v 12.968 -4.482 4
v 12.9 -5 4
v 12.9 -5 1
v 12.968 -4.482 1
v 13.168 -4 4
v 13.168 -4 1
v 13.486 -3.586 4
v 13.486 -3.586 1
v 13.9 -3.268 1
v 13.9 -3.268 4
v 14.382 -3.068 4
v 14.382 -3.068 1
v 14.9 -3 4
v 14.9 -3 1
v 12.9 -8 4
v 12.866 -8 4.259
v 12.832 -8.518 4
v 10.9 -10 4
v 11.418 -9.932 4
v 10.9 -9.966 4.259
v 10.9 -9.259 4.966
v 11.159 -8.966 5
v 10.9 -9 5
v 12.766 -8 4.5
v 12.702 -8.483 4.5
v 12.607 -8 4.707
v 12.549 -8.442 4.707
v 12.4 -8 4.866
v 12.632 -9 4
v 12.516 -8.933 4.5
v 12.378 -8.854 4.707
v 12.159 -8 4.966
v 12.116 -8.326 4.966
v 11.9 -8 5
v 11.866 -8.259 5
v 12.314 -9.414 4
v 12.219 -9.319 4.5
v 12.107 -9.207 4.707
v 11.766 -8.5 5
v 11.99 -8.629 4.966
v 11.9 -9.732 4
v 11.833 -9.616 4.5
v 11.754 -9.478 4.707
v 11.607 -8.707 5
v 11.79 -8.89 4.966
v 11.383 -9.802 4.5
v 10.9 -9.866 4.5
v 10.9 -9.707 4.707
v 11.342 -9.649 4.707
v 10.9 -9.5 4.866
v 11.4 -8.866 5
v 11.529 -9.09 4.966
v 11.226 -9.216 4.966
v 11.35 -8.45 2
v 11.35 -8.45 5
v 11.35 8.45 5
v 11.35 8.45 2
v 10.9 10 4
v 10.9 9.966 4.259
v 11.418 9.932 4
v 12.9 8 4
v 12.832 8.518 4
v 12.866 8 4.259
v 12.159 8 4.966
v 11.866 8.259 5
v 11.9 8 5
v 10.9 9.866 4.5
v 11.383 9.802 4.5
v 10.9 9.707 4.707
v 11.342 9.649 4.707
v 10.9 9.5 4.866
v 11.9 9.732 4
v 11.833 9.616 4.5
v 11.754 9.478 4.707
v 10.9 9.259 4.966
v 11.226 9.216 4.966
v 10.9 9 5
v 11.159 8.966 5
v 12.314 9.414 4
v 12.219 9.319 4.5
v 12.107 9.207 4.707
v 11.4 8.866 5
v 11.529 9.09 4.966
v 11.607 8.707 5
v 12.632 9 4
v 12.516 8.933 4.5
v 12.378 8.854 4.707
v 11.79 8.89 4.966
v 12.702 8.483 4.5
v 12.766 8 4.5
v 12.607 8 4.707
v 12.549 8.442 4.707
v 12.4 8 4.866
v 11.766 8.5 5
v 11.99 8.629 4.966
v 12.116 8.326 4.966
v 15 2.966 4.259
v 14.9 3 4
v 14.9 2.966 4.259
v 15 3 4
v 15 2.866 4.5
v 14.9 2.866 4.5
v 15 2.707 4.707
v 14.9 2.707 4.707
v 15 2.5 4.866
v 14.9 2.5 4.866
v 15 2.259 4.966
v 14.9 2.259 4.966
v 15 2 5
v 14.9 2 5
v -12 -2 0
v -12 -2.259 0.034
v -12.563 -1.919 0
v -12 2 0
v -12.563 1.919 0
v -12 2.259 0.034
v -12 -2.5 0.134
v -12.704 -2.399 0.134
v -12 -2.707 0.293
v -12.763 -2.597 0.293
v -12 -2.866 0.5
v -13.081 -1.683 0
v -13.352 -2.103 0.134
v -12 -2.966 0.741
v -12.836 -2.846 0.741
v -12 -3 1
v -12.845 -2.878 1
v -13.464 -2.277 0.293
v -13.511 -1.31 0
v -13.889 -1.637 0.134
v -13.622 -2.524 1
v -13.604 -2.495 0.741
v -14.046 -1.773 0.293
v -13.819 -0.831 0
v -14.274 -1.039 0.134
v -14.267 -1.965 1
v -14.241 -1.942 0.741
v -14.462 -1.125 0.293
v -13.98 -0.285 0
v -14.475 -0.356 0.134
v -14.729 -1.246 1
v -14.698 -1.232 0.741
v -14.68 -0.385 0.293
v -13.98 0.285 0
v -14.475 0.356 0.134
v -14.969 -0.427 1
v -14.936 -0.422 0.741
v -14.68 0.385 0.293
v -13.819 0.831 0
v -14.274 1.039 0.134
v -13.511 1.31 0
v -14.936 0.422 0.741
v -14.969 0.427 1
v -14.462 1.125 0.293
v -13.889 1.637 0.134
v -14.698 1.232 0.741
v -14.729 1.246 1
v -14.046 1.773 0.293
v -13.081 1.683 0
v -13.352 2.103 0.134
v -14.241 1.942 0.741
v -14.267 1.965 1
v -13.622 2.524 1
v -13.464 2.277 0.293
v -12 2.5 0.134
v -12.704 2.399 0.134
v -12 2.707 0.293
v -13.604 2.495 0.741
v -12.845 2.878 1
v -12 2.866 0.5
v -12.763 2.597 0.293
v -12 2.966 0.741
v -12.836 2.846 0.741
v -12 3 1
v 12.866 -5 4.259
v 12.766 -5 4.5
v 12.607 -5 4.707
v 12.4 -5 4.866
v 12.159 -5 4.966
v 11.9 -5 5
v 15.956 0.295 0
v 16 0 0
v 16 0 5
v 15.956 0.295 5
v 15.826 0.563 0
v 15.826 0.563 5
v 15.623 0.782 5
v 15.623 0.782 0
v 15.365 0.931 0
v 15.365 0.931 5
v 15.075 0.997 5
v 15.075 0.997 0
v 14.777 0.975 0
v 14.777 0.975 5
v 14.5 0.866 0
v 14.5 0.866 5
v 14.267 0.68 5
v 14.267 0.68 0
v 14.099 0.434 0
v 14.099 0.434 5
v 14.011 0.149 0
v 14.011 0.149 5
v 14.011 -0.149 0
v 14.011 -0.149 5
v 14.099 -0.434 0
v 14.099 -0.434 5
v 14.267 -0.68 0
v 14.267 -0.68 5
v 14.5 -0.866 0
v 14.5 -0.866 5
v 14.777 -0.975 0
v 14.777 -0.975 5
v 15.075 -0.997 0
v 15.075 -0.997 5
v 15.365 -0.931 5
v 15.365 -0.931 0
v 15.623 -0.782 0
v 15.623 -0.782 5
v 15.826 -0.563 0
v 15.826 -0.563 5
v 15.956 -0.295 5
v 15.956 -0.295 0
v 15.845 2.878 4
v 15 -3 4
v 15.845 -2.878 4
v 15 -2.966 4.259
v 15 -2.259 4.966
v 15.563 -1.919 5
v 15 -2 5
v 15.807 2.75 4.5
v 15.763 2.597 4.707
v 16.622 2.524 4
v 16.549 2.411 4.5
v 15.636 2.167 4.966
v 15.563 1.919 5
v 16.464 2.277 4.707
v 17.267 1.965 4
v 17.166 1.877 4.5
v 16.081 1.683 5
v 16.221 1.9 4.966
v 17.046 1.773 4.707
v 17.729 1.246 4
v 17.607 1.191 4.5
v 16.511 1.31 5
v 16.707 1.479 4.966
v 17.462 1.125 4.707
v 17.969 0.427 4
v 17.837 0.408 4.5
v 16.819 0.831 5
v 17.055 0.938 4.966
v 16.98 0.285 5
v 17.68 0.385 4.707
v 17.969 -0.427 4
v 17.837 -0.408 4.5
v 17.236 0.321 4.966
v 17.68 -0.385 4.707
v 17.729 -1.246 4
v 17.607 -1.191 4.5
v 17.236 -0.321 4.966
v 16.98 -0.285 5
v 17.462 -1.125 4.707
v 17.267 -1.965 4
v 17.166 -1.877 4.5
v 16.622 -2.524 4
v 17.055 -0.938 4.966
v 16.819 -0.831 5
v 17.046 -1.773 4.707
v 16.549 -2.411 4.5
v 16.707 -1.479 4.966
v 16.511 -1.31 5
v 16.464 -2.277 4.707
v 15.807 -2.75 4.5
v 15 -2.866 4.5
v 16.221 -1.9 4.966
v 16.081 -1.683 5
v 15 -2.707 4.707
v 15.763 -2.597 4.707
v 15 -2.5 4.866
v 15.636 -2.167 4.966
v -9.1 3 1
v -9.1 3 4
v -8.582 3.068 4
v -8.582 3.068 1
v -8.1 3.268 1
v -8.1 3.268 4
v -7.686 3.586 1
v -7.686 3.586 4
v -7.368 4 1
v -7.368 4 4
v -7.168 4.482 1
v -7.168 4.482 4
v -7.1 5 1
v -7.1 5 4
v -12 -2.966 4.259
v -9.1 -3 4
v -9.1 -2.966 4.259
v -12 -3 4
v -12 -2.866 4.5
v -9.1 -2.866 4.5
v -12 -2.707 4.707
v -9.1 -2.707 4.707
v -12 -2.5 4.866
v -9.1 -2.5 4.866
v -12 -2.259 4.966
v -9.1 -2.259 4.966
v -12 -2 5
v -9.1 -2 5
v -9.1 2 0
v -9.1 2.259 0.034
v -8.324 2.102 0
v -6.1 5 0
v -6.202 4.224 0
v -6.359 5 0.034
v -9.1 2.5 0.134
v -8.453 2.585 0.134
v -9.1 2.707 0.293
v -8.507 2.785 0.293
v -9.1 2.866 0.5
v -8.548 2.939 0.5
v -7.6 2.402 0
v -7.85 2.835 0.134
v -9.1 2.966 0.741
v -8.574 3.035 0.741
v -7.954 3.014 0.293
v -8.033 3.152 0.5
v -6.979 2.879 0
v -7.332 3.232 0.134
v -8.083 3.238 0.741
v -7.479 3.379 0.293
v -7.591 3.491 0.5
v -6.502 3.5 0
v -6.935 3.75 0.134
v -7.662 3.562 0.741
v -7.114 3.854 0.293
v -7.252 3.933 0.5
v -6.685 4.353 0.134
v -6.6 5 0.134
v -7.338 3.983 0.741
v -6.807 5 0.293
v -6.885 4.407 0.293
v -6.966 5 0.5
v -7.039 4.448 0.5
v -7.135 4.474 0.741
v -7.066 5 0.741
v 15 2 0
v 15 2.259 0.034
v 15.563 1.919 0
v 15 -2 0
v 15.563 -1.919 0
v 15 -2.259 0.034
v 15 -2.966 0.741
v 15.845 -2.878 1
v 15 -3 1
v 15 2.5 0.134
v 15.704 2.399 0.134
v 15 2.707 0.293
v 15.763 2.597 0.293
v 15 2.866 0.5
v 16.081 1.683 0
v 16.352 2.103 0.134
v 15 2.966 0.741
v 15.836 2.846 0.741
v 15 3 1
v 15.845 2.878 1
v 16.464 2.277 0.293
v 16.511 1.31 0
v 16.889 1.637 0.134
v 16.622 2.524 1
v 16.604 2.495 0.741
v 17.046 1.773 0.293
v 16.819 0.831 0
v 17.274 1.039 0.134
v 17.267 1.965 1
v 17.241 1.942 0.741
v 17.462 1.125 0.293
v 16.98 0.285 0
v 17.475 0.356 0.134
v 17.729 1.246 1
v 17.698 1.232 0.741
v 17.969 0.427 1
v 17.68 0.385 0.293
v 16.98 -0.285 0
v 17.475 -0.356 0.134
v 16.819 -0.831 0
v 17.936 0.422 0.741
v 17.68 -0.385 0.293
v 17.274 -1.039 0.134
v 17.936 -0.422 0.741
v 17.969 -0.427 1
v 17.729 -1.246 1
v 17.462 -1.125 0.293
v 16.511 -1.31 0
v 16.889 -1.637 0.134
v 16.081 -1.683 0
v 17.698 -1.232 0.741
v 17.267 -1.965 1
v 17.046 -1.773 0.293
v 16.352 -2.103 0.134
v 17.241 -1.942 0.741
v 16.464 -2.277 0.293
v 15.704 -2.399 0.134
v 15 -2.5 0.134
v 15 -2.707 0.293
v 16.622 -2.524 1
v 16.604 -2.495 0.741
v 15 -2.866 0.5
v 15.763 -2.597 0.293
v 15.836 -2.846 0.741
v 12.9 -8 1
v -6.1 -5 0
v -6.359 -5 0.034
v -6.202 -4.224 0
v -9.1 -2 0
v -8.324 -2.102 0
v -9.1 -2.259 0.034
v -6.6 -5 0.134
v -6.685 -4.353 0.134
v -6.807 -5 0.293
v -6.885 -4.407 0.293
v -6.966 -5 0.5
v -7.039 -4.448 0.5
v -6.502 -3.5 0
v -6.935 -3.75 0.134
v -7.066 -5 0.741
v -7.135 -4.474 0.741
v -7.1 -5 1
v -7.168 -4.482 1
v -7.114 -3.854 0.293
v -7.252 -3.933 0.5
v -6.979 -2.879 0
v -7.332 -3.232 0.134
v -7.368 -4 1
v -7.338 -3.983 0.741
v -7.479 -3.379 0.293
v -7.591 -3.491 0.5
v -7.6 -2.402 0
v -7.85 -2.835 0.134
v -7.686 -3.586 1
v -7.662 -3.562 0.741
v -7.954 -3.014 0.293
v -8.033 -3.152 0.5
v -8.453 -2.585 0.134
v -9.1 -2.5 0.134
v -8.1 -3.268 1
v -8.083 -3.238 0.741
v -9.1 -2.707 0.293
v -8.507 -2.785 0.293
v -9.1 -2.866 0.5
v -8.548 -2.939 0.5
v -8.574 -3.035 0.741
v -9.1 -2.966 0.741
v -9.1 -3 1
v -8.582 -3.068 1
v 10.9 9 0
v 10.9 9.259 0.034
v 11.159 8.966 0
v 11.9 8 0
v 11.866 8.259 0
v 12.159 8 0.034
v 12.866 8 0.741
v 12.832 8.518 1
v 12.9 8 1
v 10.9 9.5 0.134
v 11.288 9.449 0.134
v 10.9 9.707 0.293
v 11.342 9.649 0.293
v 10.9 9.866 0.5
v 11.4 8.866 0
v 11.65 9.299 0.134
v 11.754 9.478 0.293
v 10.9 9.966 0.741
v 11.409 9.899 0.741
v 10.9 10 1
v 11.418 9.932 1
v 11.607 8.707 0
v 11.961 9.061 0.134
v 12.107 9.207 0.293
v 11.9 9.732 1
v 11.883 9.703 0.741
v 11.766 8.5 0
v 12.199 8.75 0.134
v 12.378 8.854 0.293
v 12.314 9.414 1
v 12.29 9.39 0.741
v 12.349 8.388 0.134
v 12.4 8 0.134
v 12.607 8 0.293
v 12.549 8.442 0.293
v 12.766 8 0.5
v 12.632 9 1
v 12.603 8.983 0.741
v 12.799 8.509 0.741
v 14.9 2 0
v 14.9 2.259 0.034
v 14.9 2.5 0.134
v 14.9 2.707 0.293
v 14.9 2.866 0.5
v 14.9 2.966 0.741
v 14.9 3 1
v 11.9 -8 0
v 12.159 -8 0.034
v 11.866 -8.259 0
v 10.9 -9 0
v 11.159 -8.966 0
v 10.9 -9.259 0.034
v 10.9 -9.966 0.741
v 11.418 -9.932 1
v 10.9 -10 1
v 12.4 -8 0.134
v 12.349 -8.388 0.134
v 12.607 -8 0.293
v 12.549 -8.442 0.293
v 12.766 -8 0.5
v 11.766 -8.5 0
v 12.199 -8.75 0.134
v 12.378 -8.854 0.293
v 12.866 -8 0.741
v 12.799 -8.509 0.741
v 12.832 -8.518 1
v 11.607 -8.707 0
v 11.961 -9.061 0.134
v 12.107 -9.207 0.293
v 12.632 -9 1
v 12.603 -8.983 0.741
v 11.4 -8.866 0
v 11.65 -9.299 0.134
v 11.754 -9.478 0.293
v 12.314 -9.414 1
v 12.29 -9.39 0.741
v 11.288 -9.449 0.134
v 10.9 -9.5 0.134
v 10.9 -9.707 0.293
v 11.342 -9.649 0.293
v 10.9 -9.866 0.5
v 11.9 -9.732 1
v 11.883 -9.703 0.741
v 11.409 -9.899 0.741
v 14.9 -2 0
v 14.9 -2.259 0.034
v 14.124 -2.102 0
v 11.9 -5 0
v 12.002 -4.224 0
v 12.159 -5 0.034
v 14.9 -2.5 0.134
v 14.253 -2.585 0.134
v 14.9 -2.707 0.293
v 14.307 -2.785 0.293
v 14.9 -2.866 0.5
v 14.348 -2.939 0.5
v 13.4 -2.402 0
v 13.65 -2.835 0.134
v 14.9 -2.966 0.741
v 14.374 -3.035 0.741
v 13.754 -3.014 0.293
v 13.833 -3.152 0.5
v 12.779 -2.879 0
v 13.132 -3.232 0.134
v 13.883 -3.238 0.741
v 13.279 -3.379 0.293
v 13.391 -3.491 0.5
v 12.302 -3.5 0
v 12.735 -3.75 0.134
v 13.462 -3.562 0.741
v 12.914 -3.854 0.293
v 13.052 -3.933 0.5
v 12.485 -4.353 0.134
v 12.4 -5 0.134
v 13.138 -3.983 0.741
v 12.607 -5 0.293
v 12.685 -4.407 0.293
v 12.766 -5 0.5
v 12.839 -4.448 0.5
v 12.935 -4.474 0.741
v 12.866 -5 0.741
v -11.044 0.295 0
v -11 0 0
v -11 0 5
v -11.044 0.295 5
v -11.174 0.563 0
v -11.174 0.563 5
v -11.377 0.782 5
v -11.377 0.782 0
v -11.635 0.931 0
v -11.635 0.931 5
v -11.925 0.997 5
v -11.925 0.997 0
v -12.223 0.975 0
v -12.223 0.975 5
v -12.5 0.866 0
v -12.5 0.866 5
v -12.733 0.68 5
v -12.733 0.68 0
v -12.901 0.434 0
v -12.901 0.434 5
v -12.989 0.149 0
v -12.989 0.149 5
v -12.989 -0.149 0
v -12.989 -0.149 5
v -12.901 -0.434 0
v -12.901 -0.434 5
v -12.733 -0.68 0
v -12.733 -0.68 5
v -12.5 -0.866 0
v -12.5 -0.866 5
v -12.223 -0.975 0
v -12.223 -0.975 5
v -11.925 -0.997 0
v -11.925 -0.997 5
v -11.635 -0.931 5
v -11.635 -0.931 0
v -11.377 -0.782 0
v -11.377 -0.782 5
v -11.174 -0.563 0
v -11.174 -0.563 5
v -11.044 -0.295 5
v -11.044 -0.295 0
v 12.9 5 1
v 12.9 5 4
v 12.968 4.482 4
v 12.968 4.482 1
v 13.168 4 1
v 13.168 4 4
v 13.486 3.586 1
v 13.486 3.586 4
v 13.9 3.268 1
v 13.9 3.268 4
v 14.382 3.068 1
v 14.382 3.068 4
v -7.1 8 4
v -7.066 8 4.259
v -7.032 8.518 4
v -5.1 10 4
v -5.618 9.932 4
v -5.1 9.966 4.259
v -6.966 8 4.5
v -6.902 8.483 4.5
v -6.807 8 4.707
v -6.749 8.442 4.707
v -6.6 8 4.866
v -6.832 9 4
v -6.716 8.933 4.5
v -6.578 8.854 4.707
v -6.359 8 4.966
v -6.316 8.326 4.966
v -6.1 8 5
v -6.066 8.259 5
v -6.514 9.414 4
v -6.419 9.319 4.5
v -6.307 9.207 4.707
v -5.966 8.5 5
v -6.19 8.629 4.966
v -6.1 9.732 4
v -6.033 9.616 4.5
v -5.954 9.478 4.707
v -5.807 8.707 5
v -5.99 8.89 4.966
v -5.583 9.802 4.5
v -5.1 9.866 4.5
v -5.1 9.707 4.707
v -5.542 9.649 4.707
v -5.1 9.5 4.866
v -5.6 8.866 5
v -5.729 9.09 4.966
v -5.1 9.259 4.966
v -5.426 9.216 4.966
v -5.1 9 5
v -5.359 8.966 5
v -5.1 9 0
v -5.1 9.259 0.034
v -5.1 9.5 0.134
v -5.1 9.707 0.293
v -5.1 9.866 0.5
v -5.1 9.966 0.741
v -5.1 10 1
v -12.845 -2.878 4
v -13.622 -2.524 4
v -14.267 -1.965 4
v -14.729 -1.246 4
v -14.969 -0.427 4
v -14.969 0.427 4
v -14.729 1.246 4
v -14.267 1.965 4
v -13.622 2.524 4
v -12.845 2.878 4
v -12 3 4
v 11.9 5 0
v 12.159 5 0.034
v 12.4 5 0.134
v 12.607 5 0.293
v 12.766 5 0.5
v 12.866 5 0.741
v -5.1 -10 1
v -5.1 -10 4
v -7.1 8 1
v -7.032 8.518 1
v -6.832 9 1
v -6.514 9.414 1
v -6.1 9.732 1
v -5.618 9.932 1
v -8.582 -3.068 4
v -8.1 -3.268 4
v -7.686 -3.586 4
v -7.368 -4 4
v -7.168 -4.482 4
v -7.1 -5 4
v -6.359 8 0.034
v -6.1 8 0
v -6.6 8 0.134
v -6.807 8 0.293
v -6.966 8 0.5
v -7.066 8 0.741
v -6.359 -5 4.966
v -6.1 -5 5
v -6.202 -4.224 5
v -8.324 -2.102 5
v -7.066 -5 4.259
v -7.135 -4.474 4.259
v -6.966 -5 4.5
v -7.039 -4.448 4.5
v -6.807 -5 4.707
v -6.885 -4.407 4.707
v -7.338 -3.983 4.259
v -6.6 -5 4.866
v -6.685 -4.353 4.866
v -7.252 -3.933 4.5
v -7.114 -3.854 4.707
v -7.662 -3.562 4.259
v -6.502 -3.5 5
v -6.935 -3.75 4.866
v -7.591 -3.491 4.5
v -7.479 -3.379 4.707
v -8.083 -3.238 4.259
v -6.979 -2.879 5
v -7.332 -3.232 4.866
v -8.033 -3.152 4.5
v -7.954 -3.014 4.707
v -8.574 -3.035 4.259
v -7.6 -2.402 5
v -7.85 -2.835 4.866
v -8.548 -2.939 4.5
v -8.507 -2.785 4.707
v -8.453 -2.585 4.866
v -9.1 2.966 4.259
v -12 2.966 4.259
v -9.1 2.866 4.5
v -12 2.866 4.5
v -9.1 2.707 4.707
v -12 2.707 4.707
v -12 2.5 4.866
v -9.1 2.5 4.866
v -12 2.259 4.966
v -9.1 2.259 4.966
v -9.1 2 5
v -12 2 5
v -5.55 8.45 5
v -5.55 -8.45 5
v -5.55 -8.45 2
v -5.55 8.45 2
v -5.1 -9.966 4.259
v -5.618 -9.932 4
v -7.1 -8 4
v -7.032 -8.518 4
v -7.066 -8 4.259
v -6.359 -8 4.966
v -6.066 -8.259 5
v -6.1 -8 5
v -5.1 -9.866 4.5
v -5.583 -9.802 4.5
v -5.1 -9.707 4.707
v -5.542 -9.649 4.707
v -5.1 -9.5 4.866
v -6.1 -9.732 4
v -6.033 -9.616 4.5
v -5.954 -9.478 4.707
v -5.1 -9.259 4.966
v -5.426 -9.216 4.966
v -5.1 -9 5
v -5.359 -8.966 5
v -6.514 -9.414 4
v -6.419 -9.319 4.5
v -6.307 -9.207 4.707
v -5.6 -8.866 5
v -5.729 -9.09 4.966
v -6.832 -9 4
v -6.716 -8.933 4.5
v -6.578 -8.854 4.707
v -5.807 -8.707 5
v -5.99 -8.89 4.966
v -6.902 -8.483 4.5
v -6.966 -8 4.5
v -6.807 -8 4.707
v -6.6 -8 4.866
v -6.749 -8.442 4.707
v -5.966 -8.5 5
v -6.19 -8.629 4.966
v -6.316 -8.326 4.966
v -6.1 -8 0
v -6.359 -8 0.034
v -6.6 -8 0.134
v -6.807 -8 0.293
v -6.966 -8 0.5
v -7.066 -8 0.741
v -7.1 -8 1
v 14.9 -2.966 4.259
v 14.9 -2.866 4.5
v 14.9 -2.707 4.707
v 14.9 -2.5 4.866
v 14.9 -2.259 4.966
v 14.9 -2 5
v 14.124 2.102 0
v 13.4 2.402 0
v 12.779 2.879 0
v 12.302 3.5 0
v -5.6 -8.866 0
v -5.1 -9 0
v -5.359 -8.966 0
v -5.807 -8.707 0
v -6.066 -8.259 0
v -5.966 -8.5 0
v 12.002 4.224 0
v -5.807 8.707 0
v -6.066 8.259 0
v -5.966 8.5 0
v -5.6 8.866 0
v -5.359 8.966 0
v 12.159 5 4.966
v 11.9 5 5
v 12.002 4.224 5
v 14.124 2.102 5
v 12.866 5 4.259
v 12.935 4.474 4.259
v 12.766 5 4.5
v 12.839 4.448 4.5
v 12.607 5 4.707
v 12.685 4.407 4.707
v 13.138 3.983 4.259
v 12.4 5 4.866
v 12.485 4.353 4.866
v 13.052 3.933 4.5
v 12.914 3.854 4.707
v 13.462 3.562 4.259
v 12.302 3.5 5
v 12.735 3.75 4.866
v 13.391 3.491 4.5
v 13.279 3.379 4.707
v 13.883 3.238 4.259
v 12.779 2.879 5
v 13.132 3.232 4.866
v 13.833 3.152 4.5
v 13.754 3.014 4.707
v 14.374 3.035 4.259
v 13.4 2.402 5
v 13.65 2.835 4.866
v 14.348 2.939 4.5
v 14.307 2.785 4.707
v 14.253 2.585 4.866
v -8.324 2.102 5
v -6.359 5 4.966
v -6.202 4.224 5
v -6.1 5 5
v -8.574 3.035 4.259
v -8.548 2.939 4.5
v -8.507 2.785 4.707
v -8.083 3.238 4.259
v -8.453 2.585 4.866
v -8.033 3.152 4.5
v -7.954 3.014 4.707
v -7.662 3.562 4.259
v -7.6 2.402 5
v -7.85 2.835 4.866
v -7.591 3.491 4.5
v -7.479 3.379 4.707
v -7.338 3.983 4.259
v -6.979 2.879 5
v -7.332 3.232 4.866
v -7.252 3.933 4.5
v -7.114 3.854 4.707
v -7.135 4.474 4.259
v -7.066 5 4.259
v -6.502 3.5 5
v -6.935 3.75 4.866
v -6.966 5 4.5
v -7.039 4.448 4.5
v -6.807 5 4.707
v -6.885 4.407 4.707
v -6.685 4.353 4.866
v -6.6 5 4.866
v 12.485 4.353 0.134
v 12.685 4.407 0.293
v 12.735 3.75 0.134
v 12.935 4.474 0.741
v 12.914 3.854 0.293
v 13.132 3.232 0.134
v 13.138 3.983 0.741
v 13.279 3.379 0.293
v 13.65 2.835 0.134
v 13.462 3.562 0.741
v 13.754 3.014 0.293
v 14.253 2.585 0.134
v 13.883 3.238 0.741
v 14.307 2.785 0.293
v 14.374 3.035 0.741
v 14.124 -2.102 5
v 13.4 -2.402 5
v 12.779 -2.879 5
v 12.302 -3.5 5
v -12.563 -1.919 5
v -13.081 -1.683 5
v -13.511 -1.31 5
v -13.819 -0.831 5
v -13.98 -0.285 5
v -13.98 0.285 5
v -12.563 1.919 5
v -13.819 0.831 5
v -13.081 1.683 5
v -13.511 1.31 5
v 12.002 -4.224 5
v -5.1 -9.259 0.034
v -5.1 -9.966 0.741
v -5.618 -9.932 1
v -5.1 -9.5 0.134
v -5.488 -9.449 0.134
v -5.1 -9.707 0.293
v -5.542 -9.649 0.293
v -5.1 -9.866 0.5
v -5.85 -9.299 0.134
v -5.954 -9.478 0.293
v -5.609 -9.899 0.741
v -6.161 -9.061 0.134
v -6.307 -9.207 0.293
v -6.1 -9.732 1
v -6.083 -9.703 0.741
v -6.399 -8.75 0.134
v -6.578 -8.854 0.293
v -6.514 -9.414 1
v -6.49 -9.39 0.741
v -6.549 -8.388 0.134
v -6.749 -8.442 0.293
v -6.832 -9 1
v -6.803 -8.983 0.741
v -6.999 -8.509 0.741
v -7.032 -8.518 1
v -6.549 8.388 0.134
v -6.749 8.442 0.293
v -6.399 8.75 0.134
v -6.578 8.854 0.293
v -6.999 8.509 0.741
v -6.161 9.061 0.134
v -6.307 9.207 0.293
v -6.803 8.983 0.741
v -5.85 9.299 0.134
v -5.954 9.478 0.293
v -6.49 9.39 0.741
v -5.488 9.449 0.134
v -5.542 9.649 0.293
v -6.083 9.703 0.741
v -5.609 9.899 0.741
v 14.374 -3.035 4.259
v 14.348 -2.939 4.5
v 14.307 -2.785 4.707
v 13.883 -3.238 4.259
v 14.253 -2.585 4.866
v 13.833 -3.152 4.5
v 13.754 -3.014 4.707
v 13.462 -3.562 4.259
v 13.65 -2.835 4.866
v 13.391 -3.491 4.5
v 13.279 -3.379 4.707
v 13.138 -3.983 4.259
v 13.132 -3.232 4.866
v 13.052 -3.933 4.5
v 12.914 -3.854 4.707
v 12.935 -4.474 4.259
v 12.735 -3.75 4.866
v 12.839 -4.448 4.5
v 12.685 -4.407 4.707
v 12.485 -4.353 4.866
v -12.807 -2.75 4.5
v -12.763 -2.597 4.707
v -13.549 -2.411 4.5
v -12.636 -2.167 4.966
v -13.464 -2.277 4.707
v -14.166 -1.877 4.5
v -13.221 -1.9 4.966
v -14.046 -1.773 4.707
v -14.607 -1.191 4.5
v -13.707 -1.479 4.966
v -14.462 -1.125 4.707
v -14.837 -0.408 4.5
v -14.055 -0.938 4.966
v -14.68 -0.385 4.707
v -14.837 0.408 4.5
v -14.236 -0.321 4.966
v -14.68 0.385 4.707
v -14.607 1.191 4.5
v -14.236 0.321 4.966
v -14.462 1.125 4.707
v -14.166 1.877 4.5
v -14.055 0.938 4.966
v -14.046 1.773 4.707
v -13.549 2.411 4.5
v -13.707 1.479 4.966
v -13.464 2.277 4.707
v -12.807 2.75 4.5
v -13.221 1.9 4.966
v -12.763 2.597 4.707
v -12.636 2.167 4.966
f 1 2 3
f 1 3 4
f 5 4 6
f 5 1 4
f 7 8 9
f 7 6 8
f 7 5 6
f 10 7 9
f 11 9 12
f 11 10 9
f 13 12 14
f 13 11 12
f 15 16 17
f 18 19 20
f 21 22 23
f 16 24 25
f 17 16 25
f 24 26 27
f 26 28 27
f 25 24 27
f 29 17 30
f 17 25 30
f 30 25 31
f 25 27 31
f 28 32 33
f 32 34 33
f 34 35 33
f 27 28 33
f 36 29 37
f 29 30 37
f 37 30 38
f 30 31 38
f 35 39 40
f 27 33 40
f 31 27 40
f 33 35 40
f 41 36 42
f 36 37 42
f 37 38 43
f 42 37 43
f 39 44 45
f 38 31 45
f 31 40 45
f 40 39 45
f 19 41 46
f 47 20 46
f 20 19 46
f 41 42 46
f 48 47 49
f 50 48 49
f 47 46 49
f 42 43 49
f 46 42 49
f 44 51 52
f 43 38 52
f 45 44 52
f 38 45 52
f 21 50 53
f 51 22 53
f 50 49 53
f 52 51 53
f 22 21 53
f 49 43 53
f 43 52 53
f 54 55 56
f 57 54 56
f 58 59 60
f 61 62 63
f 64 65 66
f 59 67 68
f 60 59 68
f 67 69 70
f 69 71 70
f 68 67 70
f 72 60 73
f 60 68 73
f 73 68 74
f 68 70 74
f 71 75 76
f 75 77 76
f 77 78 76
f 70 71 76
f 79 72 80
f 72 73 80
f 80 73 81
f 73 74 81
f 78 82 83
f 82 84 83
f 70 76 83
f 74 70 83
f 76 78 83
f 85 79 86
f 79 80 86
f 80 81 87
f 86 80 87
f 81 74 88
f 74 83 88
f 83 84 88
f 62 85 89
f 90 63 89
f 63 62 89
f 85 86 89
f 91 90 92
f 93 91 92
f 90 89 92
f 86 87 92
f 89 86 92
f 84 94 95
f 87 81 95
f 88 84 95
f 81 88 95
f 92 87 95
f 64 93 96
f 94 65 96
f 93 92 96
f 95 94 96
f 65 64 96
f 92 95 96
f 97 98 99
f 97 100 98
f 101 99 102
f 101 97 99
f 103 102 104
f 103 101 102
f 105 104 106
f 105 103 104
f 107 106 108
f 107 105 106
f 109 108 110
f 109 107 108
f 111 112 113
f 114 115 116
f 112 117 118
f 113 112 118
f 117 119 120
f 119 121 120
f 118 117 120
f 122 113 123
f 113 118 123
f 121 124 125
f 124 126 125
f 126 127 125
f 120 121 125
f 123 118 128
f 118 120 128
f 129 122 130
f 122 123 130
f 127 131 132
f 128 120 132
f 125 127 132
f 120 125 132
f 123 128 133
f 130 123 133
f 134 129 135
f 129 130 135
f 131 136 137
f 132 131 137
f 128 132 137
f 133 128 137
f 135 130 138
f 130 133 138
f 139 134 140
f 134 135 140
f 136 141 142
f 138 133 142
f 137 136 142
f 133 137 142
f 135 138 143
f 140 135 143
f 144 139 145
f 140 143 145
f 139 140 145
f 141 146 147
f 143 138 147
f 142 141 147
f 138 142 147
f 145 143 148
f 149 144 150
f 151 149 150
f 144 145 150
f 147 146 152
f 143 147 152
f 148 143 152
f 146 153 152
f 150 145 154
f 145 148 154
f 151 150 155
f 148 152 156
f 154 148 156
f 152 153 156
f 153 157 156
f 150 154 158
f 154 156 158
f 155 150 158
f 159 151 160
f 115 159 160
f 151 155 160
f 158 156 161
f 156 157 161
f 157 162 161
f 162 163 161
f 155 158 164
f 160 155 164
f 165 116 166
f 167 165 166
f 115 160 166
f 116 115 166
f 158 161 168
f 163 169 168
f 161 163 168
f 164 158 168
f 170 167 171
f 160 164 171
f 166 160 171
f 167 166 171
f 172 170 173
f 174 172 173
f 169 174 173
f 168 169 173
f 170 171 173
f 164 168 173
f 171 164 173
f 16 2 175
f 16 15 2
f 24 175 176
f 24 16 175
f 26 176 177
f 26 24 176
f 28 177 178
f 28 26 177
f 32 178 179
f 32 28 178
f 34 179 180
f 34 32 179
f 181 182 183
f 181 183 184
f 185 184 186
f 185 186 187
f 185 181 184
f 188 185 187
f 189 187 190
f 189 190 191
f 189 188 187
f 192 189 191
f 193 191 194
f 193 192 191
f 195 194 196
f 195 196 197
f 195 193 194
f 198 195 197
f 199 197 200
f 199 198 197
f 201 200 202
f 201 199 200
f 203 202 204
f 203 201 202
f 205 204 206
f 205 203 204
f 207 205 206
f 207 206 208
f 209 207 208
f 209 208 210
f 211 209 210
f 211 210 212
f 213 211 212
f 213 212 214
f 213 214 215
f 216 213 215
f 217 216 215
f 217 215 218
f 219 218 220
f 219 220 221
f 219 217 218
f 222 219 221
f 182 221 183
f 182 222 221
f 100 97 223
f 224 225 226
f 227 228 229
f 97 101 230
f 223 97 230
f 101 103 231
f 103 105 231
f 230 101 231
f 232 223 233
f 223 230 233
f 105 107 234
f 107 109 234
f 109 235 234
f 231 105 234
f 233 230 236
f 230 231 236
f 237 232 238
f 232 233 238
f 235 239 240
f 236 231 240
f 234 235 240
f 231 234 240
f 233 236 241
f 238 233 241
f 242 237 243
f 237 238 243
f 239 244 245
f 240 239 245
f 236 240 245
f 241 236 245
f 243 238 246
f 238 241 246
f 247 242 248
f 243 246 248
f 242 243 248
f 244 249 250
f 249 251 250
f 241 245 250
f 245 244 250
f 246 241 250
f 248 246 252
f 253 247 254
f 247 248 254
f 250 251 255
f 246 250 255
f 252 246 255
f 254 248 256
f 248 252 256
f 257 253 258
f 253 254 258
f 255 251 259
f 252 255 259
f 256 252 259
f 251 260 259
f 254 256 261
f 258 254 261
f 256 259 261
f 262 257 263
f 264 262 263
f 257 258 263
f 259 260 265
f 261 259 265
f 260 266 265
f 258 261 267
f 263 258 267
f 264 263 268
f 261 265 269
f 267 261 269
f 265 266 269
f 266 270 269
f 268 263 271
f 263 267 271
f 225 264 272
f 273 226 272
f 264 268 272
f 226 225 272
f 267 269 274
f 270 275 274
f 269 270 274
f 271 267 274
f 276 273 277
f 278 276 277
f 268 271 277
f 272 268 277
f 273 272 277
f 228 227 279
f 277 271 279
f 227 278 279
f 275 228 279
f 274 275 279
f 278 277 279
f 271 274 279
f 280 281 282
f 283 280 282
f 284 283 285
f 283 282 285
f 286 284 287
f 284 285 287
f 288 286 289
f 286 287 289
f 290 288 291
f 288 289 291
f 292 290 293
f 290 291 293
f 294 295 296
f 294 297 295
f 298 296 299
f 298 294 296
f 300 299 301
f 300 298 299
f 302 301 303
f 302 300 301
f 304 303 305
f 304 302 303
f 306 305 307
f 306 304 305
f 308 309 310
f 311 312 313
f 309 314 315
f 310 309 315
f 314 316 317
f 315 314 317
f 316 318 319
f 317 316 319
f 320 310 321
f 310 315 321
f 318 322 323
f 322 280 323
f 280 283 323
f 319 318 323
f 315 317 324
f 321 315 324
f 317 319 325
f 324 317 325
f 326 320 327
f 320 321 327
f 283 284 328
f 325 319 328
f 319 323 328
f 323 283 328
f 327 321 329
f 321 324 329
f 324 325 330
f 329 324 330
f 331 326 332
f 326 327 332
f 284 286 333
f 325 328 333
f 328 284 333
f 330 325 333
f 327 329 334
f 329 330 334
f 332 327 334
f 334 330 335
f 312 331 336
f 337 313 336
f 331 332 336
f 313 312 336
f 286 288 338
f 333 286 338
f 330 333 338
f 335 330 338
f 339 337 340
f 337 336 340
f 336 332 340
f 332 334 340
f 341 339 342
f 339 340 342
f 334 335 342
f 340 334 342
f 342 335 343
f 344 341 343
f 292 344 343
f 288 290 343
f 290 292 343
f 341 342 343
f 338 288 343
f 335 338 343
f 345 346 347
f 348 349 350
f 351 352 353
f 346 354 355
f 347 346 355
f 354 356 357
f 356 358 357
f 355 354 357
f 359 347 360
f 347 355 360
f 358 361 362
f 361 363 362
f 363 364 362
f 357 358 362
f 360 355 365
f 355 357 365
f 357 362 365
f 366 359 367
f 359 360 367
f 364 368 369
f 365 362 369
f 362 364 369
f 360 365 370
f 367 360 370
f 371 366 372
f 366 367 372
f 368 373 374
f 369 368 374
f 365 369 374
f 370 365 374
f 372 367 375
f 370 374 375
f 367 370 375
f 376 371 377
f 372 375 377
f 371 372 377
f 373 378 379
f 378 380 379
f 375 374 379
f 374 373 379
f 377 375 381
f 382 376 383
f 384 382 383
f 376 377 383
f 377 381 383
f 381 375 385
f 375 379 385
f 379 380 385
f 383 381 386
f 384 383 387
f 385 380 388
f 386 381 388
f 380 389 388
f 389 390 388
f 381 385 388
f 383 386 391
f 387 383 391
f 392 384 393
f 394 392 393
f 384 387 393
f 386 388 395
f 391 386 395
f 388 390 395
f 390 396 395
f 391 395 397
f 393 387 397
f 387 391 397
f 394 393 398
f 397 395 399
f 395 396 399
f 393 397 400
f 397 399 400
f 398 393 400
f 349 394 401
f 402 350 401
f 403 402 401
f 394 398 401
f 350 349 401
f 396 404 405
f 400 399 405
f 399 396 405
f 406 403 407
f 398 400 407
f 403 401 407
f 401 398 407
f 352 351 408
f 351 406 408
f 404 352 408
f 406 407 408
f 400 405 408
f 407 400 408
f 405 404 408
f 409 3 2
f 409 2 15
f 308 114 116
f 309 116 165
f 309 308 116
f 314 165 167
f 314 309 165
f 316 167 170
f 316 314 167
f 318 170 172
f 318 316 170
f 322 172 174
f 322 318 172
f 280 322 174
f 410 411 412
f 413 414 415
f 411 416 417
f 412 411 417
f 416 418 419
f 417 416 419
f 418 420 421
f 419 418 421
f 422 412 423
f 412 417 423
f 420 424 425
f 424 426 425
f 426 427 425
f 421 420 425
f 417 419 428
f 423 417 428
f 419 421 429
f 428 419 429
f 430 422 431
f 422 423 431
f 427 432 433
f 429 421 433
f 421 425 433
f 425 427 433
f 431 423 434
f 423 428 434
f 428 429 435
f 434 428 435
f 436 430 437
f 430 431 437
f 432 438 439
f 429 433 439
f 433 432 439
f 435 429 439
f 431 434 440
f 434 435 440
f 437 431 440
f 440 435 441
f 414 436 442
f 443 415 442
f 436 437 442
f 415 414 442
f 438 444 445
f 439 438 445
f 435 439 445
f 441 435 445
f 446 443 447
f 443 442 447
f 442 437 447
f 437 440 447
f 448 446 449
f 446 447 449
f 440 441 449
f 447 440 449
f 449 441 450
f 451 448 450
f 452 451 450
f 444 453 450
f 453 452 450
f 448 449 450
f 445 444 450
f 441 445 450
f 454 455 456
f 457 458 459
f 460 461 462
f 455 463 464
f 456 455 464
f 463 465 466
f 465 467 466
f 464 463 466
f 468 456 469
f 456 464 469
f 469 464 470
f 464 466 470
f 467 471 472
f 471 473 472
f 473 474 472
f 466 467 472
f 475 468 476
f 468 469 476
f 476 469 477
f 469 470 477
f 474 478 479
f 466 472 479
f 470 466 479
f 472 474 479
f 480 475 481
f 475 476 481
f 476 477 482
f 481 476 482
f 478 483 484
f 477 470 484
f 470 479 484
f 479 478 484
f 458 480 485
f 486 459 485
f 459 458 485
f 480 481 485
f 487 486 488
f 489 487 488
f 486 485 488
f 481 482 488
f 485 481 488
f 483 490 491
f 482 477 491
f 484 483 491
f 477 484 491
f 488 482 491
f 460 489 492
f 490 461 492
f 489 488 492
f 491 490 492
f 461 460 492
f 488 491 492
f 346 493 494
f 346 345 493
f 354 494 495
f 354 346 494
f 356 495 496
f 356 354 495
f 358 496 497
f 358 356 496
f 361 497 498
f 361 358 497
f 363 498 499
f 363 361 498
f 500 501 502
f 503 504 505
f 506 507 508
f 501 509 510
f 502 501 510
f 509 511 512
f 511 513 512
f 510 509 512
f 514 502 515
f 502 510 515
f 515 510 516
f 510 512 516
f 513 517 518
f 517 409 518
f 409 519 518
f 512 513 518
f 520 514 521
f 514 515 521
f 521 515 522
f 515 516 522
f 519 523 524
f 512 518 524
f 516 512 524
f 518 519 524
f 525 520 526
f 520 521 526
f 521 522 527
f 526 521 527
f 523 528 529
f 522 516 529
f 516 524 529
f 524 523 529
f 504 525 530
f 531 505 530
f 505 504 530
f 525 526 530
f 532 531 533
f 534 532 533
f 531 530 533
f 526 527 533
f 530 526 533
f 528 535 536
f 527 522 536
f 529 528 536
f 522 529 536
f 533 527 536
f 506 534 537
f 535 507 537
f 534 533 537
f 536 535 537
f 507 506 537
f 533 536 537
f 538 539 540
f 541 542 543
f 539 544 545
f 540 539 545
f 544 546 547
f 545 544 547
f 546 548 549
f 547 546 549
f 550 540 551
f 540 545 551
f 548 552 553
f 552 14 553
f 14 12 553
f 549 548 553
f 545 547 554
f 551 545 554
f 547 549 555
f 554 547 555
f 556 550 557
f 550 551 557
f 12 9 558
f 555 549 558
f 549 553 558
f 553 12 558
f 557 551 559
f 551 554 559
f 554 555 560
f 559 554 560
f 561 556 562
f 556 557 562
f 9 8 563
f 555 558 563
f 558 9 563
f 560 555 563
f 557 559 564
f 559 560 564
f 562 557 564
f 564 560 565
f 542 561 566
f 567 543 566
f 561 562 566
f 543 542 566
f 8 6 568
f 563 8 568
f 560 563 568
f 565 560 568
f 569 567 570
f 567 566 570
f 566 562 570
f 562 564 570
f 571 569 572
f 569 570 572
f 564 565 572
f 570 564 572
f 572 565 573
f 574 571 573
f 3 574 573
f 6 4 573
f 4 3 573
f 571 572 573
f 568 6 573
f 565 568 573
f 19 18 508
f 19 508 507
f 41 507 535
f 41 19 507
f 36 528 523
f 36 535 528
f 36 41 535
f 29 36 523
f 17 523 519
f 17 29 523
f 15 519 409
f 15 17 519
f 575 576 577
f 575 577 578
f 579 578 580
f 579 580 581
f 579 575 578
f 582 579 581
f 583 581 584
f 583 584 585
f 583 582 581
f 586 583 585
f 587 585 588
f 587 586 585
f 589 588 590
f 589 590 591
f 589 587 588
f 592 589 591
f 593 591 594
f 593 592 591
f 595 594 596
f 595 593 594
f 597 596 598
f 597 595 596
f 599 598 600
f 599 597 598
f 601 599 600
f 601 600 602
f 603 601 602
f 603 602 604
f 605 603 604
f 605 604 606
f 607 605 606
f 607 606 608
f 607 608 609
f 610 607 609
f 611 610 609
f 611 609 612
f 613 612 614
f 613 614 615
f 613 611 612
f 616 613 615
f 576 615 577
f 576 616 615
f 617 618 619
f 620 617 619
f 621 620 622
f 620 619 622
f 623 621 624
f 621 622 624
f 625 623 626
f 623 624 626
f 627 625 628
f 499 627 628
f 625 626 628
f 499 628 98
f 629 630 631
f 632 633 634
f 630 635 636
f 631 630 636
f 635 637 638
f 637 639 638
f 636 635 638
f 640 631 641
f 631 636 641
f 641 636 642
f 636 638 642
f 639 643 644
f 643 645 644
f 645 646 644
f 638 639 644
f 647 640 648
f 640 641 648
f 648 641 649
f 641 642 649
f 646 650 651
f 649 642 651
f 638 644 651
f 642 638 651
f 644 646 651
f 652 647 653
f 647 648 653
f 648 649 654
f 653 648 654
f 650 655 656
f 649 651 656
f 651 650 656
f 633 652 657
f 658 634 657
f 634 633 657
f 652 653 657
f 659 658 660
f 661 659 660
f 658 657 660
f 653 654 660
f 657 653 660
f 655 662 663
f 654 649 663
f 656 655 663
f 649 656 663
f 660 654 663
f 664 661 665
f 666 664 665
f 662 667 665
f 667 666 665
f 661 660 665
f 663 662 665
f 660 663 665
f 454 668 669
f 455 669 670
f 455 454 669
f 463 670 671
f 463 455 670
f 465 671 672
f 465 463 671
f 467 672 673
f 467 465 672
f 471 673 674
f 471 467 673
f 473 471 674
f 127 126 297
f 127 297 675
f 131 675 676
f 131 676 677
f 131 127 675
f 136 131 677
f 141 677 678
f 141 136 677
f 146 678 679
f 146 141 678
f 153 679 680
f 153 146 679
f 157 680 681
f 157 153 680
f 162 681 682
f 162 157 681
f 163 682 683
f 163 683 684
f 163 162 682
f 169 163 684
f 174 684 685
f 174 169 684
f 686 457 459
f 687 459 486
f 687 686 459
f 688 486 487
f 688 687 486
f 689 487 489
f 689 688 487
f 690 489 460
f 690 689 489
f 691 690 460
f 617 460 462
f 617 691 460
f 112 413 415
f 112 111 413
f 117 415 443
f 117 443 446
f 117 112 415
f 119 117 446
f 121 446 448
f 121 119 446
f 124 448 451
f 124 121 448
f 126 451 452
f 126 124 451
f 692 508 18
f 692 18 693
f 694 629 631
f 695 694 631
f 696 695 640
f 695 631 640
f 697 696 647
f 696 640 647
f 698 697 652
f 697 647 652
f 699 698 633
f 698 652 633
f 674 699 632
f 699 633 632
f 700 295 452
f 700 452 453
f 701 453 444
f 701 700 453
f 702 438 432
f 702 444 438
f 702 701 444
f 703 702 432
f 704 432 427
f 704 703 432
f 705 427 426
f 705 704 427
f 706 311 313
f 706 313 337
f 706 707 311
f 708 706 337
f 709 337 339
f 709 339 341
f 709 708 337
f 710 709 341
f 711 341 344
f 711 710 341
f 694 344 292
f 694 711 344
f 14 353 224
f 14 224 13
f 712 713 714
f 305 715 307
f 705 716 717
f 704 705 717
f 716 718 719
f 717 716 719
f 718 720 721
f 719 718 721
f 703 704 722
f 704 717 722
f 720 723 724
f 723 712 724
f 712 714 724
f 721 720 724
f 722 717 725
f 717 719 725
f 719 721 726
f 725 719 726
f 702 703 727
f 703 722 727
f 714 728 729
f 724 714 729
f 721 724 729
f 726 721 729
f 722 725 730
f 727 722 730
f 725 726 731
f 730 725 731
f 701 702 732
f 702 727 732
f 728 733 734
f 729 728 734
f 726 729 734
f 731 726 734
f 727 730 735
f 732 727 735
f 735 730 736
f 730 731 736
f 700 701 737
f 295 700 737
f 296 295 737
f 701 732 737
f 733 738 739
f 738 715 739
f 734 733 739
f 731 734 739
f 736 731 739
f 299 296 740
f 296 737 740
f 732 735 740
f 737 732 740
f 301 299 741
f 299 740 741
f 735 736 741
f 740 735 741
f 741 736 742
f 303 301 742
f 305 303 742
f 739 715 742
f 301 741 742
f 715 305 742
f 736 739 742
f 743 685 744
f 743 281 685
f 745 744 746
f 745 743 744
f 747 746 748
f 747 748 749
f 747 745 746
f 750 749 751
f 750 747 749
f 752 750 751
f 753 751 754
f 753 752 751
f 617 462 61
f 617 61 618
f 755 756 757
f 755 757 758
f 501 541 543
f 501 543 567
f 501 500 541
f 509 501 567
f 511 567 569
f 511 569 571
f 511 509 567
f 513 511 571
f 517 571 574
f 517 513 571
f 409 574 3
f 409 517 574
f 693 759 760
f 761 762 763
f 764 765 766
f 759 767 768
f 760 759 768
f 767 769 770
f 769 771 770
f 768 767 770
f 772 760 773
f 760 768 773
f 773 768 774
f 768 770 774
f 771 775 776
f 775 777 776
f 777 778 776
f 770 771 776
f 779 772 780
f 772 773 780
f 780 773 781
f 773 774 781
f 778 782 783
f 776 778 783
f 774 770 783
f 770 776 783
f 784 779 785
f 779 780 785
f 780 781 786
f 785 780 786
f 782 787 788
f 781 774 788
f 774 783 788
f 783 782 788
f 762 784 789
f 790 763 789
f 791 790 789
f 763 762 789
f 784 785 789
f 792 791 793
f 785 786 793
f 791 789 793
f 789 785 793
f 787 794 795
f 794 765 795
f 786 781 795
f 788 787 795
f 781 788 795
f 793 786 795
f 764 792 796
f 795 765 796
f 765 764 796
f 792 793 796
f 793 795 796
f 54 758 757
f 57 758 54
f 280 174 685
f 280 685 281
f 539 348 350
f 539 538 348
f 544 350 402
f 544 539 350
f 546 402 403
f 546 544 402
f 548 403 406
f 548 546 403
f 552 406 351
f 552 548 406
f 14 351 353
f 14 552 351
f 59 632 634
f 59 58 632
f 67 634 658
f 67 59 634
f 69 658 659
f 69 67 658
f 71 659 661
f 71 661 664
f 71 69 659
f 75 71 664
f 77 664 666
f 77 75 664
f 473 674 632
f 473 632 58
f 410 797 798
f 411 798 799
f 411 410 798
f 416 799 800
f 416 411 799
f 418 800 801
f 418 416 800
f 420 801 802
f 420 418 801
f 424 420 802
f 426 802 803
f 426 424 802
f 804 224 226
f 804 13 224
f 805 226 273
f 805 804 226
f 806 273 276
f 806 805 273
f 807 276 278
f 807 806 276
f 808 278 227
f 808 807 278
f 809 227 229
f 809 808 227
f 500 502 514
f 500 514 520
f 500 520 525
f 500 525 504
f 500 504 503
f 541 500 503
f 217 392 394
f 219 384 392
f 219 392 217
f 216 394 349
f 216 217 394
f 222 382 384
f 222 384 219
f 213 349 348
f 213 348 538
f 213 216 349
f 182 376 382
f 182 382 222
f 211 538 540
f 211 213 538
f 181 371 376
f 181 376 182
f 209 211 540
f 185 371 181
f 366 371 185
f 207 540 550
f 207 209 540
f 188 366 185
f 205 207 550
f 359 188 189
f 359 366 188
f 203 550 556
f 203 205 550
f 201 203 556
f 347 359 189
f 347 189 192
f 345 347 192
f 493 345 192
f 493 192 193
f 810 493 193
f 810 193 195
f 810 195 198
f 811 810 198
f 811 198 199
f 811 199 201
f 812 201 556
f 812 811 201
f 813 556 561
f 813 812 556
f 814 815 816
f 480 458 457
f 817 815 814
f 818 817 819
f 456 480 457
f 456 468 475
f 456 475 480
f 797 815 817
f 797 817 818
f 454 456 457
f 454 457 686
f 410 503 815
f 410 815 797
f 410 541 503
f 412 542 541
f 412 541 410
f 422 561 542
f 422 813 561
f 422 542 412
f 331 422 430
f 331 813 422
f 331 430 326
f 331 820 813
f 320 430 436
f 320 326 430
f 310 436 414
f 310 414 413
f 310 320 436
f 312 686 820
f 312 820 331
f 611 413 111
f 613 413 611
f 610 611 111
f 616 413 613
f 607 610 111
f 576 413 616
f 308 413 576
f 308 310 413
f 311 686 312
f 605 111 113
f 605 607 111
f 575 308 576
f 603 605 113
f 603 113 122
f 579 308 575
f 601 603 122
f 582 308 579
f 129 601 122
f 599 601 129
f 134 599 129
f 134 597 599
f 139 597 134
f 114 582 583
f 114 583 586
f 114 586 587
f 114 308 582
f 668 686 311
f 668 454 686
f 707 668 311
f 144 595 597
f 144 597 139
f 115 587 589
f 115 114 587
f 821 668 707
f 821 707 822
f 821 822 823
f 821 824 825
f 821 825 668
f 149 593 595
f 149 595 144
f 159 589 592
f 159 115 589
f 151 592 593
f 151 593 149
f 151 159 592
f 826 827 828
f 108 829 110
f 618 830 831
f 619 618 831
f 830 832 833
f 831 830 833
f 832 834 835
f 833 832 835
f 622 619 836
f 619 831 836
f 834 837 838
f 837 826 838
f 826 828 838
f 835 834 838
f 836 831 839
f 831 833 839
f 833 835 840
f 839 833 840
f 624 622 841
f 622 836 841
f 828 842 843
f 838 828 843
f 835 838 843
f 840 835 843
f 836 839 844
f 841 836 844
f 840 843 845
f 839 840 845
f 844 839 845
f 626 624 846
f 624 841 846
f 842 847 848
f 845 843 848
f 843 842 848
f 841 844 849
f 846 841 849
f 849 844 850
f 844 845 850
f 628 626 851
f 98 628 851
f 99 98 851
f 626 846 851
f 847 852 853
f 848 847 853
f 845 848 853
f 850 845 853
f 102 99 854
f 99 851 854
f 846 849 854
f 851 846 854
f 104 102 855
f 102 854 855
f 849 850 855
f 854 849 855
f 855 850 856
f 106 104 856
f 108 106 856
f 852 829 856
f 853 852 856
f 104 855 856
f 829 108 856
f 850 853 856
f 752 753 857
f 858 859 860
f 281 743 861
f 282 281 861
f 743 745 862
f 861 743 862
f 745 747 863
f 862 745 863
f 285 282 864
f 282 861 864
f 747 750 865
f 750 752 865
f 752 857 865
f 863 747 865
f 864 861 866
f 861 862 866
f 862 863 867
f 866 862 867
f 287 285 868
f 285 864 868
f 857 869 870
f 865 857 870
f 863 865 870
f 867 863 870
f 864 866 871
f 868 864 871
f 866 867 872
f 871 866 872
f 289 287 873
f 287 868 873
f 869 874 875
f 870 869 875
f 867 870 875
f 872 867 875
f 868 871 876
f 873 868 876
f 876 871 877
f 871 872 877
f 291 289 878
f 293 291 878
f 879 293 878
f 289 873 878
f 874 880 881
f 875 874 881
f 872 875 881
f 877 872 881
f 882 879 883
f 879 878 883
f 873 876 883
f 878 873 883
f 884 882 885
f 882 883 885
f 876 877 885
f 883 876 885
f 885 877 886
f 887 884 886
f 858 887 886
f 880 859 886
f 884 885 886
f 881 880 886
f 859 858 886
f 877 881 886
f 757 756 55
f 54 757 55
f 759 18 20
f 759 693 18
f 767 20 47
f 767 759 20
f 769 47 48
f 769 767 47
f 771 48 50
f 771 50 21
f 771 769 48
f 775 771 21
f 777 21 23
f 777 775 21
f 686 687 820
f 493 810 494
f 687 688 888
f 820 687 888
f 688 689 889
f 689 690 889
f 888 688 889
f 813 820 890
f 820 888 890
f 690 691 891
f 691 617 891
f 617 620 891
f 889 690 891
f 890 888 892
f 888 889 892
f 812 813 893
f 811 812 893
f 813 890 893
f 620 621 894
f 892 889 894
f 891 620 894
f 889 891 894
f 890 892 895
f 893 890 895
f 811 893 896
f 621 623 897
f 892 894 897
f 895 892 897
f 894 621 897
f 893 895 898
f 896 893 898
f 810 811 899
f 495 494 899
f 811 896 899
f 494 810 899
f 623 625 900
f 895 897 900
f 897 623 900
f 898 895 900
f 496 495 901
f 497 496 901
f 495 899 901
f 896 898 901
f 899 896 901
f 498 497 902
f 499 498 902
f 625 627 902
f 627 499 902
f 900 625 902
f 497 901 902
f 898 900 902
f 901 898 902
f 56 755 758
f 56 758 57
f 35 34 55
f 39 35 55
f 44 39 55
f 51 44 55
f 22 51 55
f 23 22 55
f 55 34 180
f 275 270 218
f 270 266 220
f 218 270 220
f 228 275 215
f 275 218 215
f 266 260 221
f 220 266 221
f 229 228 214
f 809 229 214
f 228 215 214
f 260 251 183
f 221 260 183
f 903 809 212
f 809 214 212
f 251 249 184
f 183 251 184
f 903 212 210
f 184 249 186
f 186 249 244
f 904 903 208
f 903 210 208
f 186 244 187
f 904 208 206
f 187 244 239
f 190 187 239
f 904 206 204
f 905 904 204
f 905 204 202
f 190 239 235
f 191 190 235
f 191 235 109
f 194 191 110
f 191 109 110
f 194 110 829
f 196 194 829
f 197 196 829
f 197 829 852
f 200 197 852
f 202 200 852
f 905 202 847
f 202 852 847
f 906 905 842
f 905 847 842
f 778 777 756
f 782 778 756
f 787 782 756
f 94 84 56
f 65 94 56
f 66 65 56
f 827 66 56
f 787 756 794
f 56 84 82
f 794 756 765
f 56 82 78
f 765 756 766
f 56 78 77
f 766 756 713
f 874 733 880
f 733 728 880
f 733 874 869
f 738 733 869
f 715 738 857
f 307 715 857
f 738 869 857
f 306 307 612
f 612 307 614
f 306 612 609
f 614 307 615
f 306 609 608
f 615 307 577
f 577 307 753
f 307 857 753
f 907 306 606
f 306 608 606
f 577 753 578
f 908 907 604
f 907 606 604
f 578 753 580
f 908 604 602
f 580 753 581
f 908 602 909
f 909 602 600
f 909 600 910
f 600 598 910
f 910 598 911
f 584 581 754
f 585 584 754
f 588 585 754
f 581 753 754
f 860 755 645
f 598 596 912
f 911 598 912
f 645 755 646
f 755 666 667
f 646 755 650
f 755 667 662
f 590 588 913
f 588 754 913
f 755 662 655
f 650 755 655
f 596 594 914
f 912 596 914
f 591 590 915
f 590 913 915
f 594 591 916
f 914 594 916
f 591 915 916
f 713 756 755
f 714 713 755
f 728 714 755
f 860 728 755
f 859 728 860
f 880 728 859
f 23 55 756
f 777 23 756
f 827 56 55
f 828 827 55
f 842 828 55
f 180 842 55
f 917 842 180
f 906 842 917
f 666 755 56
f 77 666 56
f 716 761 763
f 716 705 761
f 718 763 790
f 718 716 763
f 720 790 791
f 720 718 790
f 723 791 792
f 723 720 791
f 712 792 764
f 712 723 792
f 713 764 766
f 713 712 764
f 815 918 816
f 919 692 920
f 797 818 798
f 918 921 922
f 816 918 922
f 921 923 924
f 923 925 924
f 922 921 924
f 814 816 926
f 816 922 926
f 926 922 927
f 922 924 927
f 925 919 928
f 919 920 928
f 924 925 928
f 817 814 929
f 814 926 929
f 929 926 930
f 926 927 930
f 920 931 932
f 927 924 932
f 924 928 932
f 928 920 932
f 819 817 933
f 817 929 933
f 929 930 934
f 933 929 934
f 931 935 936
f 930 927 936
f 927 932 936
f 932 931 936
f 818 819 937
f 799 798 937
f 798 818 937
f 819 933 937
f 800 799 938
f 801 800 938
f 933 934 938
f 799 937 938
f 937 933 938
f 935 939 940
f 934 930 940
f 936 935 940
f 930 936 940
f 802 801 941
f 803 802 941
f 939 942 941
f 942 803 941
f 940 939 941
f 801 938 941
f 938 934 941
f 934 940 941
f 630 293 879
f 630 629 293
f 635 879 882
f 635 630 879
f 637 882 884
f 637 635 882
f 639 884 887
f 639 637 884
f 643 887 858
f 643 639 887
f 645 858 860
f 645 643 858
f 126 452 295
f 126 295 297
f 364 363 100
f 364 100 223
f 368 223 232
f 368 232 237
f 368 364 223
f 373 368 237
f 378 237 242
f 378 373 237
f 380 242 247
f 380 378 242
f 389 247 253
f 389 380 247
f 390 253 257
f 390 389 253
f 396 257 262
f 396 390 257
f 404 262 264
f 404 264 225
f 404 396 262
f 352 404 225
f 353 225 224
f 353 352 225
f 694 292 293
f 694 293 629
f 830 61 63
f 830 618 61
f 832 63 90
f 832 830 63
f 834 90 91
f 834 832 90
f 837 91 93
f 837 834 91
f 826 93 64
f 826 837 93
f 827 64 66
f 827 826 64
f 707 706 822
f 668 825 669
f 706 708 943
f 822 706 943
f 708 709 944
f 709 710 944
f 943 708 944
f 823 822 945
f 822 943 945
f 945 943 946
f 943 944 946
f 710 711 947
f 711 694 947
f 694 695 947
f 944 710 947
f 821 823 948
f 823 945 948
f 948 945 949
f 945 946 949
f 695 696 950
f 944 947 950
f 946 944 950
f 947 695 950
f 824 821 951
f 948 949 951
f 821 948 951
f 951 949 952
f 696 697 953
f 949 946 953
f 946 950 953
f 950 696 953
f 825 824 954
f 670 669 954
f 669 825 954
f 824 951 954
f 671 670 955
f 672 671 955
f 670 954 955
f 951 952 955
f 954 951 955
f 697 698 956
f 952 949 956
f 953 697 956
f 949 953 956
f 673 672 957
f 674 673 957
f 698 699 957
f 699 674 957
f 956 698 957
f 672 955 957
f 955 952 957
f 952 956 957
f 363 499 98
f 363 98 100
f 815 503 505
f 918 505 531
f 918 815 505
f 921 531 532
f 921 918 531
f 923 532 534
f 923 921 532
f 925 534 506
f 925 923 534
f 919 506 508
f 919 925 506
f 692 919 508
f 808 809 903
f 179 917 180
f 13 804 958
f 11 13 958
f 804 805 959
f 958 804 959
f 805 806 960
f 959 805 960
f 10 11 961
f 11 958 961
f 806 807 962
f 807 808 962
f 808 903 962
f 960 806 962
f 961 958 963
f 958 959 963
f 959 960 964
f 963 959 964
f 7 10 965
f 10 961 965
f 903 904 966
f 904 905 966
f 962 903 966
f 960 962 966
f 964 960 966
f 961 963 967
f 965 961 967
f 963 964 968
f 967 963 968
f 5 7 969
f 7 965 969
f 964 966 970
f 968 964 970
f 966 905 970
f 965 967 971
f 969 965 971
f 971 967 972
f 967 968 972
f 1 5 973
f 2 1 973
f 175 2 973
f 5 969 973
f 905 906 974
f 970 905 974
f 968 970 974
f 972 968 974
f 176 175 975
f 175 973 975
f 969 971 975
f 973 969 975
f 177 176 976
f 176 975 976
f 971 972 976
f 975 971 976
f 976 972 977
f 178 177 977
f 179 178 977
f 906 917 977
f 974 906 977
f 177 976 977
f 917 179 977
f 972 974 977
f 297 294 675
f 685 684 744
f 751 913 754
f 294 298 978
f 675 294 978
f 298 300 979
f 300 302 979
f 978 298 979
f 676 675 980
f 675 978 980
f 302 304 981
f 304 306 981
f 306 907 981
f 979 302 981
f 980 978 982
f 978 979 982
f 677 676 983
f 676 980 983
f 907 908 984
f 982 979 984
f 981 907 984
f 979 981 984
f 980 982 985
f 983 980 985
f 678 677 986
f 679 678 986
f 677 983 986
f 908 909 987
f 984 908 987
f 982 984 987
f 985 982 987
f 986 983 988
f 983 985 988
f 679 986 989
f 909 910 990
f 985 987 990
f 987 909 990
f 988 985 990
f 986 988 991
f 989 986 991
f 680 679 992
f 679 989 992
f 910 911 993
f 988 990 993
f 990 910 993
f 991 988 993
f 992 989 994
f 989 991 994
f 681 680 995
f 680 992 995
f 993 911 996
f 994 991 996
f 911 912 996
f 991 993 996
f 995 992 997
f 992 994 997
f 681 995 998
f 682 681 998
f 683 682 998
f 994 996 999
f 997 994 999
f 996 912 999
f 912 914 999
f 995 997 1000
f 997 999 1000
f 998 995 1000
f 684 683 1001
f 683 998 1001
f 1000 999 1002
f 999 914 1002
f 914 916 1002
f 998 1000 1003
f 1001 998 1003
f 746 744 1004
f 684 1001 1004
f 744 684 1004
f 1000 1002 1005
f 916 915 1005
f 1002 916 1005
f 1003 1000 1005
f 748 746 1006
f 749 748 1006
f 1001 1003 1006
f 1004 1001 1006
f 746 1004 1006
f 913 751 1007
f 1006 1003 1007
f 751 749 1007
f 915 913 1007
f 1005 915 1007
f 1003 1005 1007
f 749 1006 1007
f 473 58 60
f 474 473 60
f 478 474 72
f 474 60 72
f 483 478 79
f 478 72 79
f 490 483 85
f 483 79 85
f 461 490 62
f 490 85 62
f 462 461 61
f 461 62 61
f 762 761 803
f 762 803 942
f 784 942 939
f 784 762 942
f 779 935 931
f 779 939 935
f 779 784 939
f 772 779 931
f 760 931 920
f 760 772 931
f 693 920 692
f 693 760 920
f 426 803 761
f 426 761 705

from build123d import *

# Parameters (mm, degrees)
SKETCH1_R           = 1
BOSS_EXTRUDE1_DEPTH = 5
SKETCH2_W           = 16.9
SKETCH2_H           = 16.9
CUT_EXTRUDE1_DEPTH  = 3
FILLET1_R           = 2
FILLET2_R           = 1


with BuildPart() as part:
    # Sketch1 → Boss-Extrude1 (new body)
    with BuildSketch(Plane.XY):
        with BuildLine():
            Line((-12, 3), (-7.1, 3))
            Line((-7.1, 3), (-7.1, 10))
            Line((-7.1, 10), (12.9, 10))
            Line((12.9, 10), (12.9, 3))
            Line((12.9, 3), (15, 3))
            ThreePointArc((15, 3), (18, 0), (15, -3))
            Line((15, -3), (12.9, -3))
            Line((12.9, -3), (12.9, -10))
            Line((12.9, -10), (-7.1, -10))
            Line((-7.1, -10), (-7.1, -3))
            Line((-7.1, -3), (-12, -3))
            ThreePointArc((-12, -3), (-15, 0), (-12, 3))
        make_face()
        with Locations((-12, 0)):
            Circle(SKETCH1_R, mode=Mode.SUBTRACT)
        with Locations((15, 0)):
            Circle(SKETCH1_R, mode=Mode.SUBTRACT)
    extrude(amount=BOSS_EXTRUDE1_DEPTH)

    # Sketch2 → Cut-Extrude1 (cut)
    with BuildSketch(Plane.XY.offset(5)):
        with Locations((2.9, 0)):
            Rectangle(SKETCH2_W, SKETCH2_H)
    extrude(amount=-CUT_EXTRUDE1_DEPTH, mode=Mode.SUBTRACT)

    # Fillet1
    fillet1_edges = [part.edges().sort_by_distance(p)[0] for p in [
        (-7.1, 10, 2.5),
        (12.9, 10, 2.5),
        (12.9, 3, 2.5),
        (12.9, -3, 2.5),
        (12.9, -10, 2.5),
        (-7.1, -10, 2.5),
        (-7.1, -3, 2.5),
        (-7.1, 3, 2.5),
    ]]
    fillet(fillet1_edges, radius=FILLET1_R)

    # Fillet2
    fillet2_edges = [part.edges().sort_by_distance(p)[0] for p in [
        (-15, 0, 5),
        (14.95, 3, 0),
        (18, 0, 0),
        (-10.55, -3, 5),
        (-10.55, -3, 0),
        (-15, 0, 0),
        (18, 0, 5),
        (14.95, 3, 5),
        (12.9, -6.5, 0),
        (12.9, -6.5, 5),
        (-7.1, 6.5, 0),
        (2.9, 10, 0),
        (12.9, 6.5, 0),
        (14.95, -3, 0),
        (2.9, -10, 0),
        (-7.1, -6.5, 0),
        (-10.55, 3, 0),
        (12.314213562, 9.414213562, 0),
        (-6.514213562, 9.414213562, 0),
        (-6.514213562, -9.414213562, 0),
        (12.314213562, -9.414213562, 0),
        (2.9, -10, 5),
        (-7.1, 6.5, 5),
        (-10.55, 3, 5),
        (-7.1, -6.5, 5),
        (14.95, -3, 5),
        (12.9, 6.5, 5),
        (2.9, 10, 5),
        (12.314213562, 9.414213562, 5),
        (-6.514213562, 9.414213562, 5),
        (-6.514213562, -9.414213562, 5),
        (12.314213562, -9.414213562, 5),
        (-7.685786438, -3.585786438, 0),
        (-7.685786438, -3.585786438, 5),
        (-7.685786438, 3.585786438, 0),
        (-7.685786438, 3.585786438, 5),
        (13.485786438, 3.585786438, 0),
        (13.485786438, 3.585786438, 5),
        (13.485786438, -3.585786438, 0),
        (13.485786438, -3.585786438, 5),
    ]]
    fillet(fillet2_edges, radius=FILLET2_R)


solid = part.part
